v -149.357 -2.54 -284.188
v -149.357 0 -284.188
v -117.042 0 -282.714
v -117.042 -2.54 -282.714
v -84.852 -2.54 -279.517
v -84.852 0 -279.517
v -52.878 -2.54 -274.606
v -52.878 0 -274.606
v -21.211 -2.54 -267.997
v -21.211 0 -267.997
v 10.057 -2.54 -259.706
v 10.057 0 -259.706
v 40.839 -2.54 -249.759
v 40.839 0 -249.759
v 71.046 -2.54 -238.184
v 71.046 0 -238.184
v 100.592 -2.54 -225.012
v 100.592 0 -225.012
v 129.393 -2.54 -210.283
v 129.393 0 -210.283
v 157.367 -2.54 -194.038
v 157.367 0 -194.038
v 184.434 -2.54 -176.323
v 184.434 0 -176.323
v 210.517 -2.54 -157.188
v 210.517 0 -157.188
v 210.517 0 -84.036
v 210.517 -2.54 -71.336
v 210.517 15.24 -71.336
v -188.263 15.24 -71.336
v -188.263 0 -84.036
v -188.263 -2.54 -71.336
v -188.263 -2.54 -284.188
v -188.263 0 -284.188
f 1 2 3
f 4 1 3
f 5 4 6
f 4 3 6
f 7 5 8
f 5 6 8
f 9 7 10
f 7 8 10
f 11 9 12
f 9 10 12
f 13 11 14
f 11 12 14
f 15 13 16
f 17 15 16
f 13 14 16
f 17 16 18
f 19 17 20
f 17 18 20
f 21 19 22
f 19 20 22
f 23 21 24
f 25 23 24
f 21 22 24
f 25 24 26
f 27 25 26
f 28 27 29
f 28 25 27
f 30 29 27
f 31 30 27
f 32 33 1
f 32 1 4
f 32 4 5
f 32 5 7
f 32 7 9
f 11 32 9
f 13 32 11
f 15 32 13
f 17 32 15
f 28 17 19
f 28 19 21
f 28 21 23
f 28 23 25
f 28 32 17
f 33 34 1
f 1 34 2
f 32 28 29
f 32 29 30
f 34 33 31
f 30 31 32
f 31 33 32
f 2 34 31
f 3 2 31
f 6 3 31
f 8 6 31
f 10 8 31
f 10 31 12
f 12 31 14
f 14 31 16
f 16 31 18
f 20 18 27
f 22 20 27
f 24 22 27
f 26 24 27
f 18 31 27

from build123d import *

# Parameters (mm, degrees)
F1_DEPTH = 2.54
F2_W     = 398.78
F2_H     = 12.7
F3_DEPTH = 15.24
F5_DEPTH = 406.4


with BuildPart() as f1:
    # F0 (on Front) → F1 (new body)
    with BuildSketch(Plane.XZ):
        with BuildLine():
            Line((210.516836579, -71.3362430625), (-188.263163421, -71.3362430625))
            Line((-188.263163421, -71.3362430625), (-188.263163421, -139.4082430625))
            Line((-188.263163421, -139.4082430625), (-188.263163421, -284.1882430625))
            Line((-188.263163421, -284.1882430625), (-172.261163421, -284.1882430625))
            Line((-172.261163421, -284.1882430625), (-149.3573673049, -284.1882430625))
            ThreePointArc((-149.3573673049, -284.1882430625), (40.8389414751, -249.7592973406), (210.516836579, -157.1882430625))
            Line((210.516836579, -157.1882430625), (210.516836579, -71.3362430625))
        make_face()
    extrude(amount=F1_DEPTH)

    # F2 (on face) → F3 (join)
    with BuildSketch(Plane(origin=(0, 0, 0), x_dir=(-1, 0, 0), z_dir=(0, 1, 0))):
        with Locations((-11.126836579, -77.6862430625)):
            Rectangle(F2_W, F2_H)
    extrude(amount=F3_DEPTH)

    # F4 (on face) → F5 (cut)
    with BuildSketch(Plane.YZ.offset(210.516836579)):
        Polygon((15.24, -71.3362430625), (0, -84.0362430625), (15.24, -84.0362430625), align=None)
    extrude(amount=-F5_DEPTH, mode=Mode.SUBTRACT)


solid = f1.part
